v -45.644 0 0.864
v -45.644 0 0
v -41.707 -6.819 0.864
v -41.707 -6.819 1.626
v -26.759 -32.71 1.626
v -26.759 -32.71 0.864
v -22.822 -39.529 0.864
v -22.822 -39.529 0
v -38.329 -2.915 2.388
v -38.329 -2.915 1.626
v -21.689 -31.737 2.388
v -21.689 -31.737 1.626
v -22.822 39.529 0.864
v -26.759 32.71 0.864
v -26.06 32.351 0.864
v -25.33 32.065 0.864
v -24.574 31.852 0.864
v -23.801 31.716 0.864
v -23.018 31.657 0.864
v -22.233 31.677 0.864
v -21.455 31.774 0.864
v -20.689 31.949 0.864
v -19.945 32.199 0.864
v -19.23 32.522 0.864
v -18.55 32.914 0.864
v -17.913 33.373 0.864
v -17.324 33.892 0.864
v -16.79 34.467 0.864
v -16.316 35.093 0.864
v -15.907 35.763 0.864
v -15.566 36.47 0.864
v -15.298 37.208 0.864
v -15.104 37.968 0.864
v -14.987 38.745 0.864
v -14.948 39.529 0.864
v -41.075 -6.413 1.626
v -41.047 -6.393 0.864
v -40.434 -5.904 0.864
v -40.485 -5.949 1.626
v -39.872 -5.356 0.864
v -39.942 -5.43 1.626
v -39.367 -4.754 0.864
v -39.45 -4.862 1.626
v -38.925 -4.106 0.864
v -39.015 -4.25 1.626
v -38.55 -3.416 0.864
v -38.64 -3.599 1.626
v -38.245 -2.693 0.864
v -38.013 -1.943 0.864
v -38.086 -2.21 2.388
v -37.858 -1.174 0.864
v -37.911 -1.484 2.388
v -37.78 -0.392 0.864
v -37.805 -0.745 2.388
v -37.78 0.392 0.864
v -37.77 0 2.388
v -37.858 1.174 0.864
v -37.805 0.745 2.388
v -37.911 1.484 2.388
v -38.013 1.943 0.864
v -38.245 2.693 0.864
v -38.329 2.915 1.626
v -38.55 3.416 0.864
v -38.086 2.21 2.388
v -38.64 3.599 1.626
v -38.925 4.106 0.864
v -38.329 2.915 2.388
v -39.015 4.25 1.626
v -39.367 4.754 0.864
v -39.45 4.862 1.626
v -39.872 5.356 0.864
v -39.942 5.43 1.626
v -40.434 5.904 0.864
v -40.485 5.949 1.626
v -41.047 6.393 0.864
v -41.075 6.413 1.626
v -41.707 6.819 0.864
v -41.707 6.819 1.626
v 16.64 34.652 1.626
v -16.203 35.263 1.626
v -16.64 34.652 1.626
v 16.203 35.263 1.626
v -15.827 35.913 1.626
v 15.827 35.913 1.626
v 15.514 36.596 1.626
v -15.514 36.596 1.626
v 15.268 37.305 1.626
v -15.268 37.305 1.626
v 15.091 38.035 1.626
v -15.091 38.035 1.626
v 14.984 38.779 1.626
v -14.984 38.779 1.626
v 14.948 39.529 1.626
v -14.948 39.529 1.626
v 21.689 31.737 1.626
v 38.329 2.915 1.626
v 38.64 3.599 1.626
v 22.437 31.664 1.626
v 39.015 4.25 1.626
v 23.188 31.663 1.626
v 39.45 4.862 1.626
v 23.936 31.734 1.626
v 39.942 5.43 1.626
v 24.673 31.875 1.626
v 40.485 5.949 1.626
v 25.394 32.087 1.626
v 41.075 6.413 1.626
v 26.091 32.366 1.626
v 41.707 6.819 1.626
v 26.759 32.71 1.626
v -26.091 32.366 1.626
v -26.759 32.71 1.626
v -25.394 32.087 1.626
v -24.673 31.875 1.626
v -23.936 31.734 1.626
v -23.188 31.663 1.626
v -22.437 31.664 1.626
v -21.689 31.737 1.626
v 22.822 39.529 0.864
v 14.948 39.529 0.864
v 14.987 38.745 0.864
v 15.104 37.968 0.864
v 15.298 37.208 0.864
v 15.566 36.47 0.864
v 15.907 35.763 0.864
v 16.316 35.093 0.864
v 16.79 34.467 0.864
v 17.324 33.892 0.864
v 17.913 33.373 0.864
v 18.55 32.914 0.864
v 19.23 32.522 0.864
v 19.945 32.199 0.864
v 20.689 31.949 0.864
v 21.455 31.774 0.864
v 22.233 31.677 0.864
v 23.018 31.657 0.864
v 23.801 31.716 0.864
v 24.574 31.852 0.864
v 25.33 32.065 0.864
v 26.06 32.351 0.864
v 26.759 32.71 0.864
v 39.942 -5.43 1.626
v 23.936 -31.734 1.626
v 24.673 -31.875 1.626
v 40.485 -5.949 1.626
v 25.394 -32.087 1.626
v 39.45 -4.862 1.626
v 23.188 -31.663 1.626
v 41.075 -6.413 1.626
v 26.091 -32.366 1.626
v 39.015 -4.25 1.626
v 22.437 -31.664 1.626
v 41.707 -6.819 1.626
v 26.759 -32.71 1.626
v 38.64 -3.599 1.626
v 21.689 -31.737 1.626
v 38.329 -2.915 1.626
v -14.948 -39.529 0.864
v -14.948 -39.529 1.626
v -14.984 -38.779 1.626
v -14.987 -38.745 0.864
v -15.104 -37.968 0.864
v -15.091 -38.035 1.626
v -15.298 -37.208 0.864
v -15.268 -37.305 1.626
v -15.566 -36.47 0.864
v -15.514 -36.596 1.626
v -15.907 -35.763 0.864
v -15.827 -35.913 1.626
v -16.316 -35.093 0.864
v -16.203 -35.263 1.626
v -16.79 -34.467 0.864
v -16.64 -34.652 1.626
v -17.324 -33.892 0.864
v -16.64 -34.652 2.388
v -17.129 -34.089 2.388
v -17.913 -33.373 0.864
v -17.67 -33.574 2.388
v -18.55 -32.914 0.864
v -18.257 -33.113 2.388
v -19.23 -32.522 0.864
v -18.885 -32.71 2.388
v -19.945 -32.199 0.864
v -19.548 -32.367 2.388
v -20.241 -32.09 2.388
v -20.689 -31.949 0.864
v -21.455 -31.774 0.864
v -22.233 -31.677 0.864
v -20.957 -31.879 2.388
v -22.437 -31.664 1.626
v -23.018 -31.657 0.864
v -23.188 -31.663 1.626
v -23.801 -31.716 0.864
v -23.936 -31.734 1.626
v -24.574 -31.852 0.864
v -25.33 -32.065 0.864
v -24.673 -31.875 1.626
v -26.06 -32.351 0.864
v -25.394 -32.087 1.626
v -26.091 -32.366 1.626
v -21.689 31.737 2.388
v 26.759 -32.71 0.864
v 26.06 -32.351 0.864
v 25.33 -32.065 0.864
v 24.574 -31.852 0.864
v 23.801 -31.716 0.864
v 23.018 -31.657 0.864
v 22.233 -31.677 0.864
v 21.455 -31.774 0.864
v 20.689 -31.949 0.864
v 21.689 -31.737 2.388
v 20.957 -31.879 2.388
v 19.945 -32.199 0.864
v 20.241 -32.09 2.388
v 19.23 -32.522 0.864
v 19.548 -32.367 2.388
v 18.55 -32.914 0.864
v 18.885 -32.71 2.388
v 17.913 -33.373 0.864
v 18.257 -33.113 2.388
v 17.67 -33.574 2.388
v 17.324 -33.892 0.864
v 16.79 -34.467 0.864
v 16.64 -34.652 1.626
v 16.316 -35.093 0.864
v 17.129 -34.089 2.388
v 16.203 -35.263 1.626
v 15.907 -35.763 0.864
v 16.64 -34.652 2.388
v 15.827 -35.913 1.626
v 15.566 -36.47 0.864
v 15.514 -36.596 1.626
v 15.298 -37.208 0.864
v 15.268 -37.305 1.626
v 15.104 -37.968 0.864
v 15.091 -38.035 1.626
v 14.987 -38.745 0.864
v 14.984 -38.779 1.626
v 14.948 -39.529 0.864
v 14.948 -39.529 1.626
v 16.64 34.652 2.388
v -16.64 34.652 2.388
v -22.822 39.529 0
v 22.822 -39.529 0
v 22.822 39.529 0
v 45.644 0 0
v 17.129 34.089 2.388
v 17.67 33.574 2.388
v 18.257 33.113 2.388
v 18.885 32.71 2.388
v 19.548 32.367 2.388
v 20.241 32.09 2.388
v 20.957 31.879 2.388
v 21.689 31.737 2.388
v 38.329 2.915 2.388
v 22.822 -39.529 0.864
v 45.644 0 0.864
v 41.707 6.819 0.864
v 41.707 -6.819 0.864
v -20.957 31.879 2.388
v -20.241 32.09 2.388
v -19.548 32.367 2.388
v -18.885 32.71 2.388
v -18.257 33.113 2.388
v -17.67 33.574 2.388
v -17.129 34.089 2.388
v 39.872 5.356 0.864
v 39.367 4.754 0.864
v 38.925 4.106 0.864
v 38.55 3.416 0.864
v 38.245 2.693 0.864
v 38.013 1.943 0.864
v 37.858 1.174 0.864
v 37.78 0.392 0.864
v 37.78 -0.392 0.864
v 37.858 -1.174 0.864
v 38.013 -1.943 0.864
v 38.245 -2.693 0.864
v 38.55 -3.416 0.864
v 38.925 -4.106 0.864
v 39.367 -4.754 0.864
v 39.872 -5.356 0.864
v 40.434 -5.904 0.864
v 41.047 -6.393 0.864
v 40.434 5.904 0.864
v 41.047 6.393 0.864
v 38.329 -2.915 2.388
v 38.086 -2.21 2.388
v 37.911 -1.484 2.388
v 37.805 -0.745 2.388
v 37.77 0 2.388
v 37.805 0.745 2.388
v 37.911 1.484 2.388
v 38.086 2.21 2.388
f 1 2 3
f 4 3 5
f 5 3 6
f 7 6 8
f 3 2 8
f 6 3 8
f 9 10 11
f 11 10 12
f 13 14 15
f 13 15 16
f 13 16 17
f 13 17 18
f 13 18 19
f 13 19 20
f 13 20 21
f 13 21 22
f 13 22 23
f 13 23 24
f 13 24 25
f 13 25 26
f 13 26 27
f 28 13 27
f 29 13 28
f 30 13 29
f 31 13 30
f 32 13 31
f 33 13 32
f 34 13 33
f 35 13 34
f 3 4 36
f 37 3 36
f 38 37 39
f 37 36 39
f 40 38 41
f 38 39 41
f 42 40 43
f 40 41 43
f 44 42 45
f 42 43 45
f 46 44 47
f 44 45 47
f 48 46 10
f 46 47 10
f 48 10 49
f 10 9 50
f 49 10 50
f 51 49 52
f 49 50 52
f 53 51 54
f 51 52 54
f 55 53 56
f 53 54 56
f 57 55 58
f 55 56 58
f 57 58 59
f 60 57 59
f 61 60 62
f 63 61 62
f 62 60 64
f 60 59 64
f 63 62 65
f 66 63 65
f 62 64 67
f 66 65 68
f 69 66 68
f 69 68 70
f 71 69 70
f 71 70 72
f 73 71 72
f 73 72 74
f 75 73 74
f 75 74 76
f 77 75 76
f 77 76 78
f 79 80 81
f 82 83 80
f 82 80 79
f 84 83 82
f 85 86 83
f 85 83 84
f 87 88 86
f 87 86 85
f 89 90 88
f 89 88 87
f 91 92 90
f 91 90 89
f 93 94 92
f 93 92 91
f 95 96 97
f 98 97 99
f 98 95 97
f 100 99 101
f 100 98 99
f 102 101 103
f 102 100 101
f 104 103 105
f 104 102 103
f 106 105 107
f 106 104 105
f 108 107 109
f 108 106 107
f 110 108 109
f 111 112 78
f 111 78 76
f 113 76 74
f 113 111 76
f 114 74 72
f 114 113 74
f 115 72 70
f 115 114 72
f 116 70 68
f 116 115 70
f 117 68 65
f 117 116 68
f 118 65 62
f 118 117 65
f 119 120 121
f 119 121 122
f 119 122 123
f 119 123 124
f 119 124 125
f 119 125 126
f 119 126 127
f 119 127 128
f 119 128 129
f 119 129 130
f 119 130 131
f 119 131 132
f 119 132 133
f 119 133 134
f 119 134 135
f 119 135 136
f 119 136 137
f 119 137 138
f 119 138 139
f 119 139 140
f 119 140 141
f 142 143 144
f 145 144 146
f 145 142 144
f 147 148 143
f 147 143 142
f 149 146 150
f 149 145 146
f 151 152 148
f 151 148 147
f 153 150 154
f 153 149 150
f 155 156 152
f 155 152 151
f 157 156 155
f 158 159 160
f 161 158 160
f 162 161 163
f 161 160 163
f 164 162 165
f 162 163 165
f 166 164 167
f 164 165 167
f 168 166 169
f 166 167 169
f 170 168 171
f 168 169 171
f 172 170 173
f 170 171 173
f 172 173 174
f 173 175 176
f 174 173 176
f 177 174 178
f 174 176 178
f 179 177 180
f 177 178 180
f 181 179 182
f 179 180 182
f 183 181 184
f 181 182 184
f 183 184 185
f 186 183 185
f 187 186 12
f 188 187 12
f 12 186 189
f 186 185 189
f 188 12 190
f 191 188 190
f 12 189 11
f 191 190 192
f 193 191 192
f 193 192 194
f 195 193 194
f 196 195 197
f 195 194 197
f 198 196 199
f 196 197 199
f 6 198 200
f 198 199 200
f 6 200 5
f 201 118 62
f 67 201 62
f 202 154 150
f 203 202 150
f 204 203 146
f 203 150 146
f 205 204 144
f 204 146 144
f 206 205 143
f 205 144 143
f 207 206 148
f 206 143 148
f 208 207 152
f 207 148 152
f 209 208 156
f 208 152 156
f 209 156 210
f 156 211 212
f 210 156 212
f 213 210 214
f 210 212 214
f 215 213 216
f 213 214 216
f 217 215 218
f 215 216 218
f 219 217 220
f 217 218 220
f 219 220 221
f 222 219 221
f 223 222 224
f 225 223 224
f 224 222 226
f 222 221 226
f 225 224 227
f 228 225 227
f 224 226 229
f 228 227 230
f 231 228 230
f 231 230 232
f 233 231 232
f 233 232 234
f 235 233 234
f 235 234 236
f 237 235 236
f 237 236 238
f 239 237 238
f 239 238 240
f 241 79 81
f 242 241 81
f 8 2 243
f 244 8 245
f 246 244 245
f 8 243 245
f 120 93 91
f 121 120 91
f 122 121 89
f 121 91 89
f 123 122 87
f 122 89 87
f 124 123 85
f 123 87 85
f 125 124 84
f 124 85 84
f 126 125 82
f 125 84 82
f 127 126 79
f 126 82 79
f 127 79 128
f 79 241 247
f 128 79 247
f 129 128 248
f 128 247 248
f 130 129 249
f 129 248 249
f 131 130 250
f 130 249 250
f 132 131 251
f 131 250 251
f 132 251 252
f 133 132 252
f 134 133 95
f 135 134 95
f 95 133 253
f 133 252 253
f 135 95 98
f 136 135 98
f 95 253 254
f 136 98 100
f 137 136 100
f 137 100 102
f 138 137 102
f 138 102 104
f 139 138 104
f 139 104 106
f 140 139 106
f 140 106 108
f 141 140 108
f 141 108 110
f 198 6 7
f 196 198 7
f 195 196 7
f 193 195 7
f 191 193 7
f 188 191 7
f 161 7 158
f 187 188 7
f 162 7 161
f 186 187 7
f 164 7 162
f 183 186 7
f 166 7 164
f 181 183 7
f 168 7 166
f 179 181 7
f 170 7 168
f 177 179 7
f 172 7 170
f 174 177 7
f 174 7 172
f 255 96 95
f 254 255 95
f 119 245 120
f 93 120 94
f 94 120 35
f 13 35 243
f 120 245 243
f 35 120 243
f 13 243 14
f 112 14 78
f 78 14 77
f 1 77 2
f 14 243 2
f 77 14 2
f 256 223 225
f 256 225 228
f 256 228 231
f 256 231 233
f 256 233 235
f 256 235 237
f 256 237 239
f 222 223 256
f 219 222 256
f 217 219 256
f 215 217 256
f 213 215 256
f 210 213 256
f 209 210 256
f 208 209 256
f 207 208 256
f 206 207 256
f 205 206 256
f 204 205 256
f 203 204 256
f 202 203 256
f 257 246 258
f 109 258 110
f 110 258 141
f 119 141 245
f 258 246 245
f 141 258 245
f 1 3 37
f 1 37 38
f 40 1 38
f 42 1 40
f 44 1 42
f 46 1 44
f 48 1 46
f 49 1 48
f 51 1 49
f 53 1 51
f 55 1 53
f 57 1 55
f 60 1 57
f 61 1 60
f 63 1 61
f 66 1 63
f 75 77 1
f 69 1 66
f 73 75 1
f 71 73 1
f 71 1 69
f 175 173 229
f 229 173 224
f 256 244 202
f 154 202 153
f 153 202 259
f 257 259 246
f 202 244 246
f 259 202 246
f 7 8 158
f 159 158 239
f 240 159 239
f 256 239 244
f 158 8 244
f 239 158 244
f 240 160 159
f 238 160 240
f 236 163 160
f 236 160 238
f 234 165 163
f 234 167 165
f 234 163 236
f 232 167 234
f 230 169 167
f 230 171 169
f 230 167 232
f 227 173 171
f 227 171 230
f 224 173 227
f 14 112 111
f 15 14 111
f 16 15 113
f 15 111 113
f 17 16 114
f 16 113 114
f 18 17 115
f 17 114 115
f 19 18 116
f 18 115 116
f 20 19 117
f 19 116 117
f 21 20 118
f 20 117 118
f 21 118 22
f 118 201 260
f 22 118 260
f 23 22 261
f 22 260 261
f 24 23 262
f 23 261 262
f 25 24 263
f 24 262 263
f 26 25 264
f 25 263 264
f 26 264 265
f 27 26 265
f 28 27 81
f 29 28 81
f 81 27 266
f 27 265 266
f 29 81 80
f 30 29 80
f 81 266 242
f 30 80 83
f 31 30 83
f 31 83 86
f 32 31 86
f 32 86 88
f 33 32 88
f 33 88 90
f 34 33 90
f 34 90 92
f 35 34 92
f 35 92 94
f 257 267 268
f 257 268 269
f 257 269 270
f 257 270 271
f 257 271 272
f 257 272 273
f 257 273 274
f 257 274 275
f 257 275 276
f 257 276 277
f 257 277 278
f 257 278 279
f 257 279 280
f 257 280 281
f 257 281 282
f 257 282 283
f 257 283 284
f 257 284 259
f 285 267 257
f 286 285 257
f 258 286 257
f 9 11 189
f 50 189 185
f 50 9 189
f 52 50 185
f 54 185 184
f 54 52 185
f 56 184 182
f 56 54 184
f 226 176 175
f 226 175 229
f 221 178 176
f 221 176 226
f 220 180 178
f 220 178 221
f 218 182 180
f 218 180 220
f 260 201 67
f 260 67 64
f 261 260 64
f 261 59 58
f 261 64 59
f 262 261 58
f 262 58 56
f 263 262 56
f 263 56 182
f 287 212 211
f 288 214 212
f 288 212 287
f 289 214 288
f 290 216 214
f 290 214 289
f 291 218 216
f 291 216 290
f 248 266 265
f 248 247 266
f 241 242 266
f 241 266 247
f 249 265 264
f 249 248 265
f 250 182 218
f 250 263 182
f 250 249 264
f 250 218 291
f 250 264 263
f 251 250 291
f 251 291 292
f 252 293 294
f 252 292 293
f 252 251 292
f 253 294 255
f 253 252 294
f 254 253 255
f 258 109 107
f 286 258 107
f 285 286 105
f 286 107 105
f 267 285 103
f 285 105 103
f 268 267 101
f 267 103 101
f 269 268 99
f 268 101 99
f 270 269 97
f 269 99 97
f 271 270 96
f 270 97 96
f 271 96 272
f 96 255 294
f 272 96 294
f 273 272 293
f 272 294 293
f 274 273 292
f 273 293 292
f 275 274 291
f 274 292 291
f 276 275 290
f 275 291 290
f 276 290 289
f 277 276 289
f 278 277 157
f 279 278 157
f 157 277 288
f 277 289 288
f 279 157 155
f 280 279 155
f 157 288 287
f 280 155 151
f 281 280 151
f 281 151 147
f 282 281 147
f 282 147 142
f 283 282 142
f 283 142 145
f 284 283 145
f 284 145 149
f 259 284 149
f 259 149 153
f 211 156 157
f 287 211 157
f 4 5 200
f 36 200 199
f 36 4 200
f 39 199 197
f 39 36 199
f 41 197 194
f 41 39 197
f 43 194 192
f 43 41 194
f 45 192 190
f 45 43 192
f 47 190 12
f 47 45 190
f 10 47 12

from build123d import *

# Parameters (mm, degrees)
F1_DEPTH = 1.6256
F3_DEPTH = 2.3876
F5_R     = 7.874
F6_DEPTH = 1.524


with BuildPart() as f1:
    # F0 (on Top) → F1 (new body)
    with BuildSketch(Plane.XY):
        Polygon((-22.8219, -39.52869), (22.8219, -39.52869), (45.6438, 0), (22.8219, 39.52869), (-22.8219, 39.52869), (-45.6438, 0), align=None)
    extrude(amount=F1_DEPTH)

    # F2 (on Top) → F3 (join)
    with BuildSketch(Plane.XY):
        Polygon((-20.006278, -34.65189), (20.006278, -34.65189), (40.012556, 0), (20.006278, 34.65189), (-20.006278, 34.65189), (-40.012556, 0), align=None)
    extrude(amount=F3_DEPTH)

    # F5 (on face) → F6 (cut)
    with BuildSketch(Plane.XY.offset(2.3876)):
        with Locations((22.8219, -39.52869)):
            Circle(F5_R)
        with Locations((45.6438, 0)):
            Circle(F5_R)
        with Locations((22.8219, 39.52869)):
            Circle(F5_R)
        with Locations((-22.8219, 39.52869)):
            Circle(F5_R)
        with Locations((-45.6438, 0)):
            Circle(F5_R)
        with Locations((-22.8219, -39.52869)):
            Circle(F5_R)
    extrude(amount=-F6_DEPTH, mode=Mode.SUBTRACT)


solid = f1.part
